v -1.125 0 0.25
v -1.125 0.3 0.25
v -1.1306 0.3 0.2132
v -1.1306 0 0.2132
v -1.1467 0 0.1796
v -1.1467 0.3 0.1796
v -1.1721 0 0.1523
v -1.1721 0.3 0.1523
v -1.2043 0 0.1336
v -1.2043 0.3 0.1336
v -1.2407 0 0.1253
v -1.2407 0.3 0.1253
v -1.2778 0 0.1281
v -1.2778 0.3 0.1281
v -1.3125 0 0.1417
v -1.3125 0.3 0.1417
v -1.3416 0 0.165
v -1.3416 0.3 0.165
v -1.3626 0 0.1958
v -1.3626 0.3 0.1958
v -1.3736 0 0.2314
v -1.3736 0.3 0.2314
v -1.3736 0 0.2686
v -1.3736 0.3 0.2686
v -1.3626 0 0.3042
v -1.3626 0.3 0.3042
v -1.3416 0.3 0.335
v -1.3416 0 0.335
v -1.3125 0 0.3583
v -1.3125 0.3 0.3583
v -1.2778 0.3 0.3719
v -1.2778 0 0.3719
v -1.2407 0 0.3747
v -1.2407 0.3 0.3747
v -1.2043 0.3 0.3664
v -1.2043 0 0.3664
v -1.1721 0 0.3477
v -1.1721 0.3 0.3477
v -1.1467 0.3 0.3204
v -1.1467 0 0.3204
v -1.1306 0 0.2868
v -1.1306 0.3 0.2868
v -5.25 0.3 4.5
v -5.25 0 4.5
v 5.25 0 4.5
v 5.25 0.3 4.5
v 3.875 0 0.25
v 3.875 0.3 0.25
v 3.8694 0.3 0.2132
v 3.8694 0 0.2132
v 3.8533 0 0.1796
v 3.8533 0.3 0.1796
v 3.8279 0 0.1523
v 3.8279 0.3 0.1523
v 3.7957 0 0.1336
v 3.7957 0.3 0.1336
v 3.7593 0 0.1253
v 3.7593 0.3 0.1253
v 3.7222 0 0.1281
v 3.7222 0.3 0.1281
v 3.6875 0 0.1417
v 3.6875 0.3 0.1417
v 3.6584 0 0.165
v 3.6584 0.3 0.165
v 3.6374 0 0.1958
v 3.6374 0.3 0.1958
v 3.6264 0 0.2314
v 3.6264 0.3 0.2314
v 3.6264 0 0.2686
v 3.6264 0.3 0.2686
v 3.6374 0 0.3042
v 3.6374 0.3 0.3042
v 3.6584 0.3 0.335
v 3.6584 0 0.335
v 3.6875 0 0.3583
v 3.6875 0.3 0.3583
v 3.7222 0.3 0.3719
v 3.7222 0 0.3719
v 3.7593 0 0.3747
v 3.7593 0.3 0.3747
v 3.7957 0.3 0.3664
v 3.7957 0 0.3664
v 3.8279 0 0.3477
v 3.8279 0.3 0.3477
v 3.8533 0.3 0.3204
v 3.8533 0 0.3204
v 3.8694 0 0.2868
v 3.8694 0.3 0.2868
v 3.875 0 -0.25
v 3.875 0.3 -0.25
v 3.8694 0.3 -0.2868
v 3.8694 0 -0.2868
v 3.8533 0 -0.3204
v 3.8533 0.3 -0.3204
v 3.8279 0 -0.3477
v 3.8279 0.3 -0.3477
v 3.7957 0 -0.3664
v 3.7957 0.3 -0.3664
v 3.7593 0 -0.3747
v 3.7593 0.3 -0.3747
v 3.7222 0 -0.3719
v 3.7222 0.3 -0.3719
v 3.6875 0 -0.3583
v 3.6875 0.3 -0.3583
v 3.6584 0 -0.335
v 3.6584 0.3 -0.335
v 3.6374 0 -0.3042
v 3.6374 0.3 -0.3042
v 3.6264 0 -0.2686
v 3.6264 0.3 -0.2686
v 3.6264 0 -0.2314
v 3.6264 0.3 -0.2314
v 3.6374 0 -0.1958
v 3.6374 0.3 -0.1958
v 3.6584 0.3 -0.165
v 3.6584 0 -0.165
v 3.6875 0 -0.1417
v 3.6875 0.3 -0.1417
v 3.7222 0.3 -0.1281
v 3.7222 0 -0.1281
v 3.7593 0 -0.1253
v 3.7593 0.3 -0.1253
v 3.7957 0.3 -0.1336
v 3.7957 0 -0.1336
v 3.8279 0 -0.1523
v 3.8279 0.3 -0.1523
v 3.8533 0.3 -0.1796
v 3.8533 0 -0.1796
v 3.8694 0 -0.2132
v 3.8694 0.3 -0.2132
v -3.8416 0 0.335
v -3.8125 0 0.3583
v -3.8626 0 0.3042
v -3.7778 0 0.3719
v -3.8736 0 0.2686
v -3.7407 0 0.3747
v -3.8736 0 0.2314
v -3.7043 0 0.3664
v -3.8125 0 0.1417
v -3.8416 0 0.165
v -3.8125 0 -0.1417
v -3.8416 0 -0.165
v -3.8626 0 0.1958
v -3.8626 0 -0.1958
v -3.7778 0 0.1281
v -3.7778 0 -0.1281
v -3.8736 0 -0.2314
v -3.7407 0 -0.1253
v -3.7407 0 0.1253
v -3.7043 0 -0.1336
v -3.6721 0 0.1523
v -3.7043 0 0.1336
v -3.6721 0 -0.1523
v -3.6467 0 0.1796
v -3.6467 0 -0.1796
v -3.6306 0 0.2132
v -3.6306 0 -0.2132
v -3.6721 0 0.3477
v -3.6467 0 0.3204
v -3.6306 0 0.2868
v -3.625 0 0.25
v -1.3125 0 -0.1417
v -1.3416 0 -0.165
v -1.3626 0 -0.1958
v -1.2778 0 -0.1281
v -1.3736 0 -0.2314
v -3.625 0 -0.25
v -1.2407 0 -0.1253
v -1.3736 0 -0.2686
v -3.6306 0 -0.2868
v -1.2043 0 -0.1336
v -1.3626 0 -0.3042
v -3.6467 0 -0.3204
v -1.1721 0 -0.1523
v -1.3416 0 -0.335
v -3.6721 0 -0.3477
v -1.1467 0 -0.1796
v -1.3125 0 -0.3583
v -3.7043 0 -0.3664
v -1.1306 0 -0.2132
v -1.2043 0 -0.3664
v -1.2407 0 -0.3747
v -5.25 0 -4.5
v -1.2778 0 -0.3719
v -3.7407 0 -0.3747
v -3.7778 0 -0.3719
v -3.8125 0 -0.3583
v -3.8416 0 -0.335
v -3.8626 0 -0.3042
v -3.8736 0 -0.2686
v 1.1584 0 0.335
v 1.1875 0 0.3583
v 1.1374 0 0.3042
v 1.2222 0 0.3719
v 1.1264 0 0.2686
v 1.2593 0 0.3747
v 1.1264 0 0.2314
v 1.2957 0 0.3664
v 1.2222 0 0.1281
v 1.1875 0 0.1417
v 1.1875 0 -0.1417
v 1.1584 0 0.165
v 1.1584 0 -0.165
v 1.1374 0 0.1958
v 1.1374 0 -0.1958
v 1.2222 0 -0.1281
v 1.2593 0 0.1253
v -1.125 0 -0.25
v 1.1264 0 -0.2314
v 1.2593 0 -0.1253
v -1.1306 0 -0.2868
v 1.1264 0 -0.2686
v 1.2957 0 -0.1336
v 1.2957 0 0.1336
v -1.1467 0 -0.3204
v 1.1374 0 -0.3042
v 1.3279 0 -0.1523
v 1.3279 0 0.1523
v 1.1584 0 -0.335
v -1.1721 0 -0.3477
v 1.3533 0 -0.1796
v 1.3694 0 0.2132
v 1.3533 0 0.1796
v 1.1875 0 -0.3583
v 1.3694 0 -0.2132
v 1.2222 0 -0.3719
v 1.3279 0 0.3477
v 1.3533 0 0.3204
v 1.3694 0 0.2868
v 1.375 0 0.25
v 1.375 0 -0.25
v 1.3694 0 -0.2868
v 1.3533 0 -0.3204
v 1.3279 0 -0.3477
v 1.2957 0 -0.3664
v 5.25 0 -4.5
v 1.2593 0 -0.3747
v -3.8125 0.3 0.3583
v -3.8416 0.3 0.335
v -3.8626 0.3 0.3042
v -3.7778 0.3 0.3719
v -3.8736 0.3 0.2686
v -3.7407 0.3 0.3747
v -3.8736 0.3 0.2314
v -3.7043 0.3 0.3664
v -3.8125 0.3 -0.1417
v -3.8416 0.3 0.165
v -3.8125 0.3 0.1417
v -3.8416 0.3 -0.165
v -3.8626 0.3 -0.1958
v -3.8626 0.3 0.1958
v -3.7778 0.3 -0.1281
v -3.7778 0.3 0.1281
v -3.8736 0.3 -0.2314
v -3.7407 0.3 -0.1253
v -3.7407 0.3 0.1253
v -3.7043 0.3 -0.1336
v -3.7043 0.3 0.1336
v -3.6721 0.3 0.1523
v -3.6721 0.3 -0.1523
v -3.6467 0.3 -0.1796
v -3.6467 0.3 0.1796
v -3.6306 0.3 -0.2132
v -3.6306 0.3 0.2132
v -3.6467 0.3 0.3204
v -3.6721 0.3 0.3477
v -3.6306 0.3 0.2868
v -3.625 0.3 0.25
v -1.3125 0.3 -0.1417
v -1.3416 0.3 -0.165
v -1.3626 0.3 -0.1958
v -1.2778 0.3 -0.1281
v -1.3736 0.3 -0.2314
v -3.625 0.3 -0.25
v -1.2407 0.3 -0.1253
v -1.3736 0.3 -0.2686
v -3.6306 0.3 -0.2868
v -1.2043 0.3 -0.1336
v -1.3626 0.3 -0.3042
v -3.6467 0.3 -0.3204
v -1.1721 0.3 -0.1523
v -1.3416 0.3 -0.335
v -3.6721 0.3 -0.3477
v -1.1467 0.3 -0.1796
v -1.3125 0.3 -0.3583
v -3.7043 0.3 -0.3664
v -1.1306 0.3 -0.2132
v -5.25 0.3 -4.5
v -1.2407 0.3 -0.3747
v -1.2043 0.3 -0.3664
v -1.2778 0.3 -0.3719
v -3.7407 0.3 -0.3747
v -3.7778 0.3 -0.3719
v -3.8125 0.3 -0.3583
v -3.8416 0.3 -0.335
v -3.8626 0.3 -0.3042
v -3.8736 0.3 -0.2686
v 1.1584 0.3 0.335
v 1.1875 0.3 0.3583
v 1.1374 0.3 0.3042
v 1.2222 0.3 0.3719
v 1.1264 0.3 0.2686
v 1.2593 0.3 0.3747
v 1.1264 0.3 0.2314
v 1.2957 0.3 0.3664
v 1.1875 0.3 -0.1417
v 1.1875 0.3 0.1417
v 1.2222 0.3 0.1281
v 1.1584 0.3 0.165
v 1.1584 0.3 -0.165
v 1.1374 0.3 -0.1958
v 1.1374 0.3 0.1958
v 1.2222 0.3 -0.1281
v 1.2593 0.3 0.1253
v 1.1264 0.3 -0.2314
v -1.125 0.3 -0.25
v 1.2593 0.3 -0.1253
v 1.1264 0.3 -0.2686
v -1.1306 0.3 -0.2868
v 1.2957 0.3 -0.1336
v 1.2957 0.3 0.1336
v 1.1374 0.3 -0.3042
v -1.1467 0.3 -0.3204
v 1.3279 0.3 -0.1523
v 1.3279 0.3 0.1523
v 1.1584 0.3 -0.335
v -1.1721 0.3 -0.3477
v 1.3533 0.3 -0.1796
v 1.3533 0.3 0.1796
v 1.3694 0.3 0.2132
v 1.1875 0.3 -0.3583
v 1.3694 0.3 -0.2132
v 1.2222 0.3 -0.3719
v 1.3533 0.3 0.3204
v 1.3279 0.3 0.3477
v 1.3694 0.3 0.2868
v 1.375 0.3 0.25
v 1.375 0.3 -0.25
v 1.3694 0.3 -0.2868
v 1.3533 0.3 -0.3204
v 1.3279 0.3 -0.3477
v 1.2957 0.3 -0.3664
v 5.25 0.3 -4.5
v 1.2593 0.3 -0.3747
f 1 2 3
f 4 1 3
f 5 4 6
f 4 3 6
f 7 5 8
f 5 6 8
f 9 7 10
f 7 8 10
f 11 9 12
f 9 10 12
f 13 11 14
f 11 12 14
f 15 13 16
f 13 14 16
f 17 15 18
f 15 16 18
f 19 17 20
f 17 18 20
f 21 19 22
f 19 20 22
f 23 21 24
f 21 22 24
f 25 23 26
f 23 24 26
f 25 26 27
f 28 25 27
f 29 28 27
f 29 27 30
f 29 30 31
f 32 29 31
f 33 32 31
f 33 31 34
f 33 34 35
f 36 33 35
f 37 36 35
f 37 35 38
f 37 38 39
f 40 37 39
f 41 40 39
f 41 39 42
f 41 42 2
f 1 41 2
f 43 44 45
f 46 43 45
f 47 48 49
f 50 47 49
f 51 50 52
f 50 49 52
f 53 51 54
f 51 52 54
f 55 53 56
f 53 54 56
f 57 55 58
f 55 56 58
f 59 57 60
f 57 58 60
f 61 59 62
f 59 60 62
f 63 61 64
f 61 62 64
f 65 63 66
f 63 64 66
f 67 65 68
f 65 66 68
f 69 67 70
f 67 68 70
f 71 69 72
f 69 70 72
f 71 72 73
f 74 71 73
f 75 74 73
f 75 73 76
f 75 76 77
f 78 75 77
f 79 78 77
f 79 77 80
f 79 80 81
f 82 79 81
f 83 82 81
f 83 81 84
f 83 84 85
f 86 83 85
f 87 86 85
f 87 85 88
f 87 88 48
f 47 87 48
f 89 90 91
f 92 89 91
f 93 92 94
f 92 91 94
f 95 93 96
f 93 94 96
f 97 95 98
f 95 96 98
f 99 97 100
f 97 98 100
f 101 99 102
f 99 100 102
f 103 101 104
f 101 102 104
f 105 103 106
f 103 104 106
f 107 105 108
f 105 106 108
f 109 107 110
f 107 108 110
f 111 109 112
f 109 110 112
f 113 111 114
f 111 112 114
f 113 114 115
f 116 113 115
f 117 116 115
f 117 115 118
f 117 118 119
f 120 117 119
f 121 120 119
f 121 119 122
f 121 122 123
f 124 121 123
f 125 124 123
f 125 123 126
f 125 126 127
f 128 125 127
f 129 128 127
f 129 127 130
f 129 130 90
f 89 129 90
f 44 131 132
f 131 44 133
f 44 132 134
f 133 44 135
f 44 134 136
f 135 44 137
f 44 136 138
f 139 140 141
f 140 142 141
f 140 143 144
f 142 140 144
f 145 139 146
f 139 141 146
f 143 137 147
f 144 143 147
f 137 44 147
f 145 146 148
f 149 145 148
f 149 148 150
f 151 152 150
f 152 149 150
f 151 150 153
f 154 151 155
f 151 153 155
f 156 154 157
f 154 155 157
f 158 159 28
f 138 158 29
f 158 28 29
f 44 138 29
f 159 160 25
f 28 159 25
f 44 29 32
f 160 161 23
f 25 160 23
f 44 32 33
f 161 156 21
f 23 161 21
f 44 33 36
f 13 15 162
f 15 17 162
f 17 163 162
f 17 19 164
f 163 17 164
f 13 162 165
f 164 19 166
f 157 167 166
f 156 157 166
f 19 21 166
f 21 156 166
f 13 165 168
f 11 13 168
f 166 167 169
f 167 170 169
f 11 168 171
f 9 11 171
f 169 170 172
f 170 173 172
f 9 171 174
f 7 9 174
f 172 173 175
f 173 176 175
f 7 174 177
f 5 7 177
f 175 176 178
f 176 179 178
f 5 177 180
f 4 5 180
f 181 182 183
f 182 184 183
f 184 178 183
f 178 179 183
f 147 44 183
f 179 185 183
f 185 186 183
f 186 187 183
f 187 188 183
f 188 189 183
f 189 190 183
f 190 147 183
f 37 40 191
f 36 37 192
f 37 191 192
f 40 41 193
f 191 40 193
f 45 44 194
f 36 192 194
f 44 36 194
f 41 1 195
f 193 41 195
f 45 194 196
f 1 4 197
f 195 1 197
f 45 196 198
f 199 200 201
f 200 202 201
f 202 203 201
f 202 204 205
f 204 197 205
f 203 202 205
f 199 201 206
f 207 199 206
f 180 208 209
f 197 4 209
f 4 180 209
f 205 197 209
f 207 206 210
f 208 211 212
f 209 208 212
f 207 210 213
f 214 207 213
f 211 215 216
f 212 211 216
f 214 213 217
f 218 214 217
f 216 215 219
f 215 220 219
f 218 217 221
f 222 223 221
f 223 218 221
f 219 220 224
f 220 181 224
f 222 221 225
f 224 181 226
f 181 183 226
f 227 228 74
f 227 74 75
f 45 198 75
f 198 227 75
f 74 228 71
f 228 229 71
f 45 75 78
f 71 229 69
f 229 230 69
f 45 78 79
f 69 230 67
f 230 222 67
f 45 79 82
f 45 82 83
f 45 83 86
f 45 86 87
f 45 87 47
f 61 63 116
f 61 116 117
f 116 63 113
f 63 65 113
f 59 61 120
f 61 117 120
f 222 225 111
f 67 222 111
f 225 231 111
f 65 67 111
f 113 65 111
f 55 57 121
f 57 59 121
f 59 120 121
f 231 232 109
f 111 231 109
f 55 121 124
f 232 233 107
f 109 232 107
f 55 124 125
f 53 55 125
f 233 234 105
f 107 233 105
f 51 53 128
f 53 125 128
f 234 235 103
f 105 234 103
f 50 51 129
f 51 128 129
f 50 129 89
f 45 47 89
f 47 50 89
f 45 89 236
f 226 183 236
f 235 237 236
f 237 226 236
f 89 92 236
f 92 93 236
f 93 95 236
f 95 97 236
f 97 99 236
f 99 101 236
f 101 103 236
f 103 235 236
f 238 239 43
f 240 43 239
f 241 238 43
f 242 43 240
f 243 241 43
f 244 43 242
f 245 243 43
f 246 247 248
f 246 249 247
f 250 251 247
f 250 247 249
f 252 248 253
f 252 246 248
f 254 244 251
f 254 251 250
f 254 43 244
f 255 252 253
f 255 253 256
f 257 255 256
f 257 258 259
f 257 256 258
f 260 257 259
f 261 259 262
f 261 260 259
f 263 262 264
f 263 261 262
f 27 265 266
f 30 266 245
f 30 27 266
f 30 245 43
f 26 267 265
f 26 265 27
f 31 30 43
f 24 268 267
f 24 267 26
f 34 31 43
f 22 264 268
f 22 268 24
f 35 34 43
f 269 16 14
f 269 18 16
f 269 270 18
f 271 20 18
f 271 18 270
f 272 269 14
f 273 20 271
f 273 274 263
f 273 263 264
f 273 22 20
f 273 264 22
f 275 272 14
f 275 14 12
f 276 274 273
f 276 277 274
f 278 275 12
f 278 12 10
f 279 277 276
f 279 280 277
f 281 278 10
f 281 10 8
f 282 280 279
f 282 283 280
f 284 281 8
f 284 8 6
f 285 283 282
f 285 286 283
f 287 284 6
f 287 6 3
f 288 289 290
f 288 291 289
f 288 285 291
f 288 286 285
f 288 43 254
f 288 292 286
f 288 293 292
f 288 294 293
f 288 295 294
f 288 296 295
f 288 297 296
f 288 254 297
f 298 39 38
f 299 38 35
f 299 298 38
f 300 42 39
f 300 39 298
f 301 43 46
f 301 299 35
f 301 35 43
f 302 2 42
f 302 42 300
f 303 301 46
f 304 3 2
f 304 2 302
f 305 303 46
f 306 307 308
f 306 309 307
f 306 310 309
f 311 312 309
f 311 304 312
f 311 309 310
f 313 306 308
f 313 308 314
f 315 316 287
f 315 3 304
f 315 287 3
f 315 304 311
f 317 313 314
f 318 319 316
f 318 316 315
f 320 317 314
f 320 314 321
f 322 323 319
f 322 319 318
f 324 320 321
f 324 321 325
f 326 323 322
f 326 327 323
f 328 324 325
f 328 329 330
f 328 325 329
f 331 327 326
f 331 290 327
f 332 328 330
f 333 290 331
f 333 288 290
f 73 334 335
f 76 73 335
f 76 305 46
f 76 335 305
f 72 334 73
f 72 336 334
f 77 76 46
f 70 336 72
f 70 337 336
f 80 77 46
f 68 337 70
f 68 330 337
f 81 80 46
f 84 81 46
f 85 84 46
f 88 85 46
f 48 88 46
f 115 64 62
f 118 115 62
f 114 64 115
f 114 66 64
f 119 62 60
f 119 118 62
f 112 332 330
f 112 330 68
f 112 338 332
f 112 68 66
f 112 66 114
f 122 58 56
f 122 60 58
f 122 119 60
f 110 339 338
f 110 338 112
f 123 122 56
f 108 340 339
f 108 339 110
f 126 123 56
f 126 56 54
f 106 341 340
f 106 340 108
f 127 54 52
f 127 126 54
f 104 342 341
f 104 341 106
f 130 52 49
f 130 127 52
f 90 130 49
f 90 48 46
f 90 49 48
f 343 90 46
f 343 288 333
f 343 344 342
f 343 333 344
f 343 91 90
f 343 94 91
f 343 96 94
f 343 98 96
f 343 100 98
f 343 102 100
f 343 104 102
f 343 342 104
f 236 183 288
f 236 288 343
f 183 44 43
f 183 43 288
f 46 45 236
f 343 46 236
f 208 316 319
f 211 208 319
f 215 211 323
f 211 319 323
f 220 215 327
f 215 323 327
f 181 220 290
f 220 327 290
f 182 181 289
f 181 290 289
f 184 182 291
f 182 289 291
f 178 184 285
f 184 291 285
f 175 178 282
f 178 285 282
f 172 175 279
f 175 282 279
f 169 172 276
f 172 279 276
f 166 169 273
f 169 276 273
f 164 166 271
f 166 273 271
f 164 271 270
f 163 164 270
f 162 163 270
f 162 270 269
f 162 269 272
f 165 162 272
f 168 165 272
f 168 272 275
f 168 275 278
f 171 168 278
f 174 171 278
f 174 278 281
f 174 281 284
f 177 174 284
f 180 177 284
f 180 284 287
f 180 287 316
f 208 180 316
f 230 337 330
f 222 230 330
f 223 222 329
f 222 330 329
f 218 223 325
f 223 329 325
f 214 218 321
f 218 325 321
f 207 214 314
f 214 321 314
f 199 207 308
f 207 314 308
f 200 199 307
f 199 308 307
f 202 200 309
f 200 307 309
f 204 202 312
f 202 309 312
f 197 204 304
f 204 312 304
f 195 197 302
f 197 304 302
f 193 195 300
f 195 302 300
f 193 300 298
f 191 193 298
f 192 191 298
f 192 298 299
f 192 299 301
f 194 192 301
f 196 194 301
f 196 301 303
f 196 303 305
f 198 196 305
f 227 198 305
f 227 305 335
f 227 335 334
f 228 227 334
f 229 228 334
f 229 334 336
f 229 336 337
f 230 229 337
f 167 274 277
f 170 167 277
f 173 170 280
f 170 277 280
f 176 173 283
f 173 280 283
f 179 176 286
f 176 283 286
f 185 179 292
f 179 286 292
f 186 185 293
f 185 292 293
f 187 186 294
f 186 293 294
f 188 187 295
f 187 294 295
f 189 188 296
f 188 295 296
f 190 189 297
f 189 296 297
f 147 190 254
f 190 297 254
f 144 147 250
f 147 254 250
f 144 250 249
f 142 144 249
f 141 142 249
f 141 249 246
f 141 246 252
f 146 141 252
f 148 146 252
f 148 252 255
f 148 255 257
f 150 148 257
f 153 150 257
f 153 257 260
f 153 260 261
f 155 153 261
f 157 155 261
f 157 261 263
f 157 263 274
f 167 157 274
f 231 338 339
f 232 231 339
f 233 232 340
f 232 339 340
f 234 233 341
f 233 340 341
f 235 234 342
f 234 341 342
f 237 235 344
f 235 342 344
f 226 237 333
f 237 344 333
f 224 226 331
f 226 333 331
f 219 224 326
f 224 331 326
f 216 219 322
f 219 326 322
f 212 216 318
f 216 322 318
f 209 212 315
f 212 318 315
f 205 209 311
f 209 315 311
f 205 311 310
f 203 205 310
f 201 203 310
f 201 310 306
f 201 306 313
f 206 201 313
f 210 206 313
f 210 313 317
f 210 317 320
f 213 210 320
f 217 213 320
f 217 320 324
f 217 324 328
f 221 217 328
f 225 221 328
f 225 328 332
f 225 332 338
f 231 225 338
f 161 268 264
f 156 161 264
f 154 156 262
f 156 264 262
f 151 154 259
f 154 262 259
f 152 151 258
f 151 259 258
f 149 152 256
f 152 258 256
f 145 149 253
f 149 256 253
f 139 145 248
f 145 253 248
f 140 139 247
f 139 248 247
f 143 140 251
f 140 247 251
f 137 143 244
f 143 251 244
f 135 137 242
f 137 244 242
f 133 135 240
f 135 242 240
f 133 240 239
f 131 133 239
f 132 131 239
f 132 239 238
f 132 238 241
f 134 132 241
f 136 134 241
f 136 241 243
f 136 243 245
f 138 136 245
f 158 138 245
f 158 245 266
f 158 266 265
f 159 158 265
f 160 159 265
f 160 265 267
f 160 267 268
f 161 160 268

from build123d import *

# Parameters (mm, degrees)
SKETCH_1_W          = 10.5
SKETCH_1_H          = 9
EXTRUDE_1_DEPTH     = 0.3
SKETCH_2_R          = 0.125
CUT_EXTRUDE_1_DEPTH = 1.3


with BuildPart() as part:
    # Эскиз1 → Бобышка-Вытянуть1 (new body)
    with BuildSketch(Plane(origin=(0, 0, 0), x_dir=(1, 0, 0), z_dir=(0, 1, 0))):
        Rectangle(SKETCH_1_W, SKETCH_1_H)
    extrude(amount=EXTRUDE_1_DEPTH)

    # Эскиз2 → Вырез-Вытянуть1 (cut, through all)
    with BuildSketch(Plane(origin=(0, 0.3, 0), x_dir=(1, 0, 0), z_dir=(0, 1, 0))):
        with Locations((-3.75, 0.25)):
            Circle(SKETCH_2_R)
        with Locations((-1.25, 0.25)):
            Circle(SKETCH_2_R)
        with Locations((1.25, 0.25)):
            Circle(SKETCH_2_R)
        with Locations((3.75, 0.25)):
            Circle(SKETCH_2_R)
        with Locations((-1.25, -0.25)):
            Circle(SKETCH_2_R)
        with Locations((1.25, -0.25)):
            Circle(SKETCH_2_R)
        with Locations((3.75, -0.25)):
            Circle(SKETCH_2_R)
        with Locations((-3.75, -0.25)):
            Circle(SKETCH_2_R)
    extrude(amount=-CUT_EXTRUDE_1_DEPTH, mode=Mode.SUBTRACT)


solid = part.part
